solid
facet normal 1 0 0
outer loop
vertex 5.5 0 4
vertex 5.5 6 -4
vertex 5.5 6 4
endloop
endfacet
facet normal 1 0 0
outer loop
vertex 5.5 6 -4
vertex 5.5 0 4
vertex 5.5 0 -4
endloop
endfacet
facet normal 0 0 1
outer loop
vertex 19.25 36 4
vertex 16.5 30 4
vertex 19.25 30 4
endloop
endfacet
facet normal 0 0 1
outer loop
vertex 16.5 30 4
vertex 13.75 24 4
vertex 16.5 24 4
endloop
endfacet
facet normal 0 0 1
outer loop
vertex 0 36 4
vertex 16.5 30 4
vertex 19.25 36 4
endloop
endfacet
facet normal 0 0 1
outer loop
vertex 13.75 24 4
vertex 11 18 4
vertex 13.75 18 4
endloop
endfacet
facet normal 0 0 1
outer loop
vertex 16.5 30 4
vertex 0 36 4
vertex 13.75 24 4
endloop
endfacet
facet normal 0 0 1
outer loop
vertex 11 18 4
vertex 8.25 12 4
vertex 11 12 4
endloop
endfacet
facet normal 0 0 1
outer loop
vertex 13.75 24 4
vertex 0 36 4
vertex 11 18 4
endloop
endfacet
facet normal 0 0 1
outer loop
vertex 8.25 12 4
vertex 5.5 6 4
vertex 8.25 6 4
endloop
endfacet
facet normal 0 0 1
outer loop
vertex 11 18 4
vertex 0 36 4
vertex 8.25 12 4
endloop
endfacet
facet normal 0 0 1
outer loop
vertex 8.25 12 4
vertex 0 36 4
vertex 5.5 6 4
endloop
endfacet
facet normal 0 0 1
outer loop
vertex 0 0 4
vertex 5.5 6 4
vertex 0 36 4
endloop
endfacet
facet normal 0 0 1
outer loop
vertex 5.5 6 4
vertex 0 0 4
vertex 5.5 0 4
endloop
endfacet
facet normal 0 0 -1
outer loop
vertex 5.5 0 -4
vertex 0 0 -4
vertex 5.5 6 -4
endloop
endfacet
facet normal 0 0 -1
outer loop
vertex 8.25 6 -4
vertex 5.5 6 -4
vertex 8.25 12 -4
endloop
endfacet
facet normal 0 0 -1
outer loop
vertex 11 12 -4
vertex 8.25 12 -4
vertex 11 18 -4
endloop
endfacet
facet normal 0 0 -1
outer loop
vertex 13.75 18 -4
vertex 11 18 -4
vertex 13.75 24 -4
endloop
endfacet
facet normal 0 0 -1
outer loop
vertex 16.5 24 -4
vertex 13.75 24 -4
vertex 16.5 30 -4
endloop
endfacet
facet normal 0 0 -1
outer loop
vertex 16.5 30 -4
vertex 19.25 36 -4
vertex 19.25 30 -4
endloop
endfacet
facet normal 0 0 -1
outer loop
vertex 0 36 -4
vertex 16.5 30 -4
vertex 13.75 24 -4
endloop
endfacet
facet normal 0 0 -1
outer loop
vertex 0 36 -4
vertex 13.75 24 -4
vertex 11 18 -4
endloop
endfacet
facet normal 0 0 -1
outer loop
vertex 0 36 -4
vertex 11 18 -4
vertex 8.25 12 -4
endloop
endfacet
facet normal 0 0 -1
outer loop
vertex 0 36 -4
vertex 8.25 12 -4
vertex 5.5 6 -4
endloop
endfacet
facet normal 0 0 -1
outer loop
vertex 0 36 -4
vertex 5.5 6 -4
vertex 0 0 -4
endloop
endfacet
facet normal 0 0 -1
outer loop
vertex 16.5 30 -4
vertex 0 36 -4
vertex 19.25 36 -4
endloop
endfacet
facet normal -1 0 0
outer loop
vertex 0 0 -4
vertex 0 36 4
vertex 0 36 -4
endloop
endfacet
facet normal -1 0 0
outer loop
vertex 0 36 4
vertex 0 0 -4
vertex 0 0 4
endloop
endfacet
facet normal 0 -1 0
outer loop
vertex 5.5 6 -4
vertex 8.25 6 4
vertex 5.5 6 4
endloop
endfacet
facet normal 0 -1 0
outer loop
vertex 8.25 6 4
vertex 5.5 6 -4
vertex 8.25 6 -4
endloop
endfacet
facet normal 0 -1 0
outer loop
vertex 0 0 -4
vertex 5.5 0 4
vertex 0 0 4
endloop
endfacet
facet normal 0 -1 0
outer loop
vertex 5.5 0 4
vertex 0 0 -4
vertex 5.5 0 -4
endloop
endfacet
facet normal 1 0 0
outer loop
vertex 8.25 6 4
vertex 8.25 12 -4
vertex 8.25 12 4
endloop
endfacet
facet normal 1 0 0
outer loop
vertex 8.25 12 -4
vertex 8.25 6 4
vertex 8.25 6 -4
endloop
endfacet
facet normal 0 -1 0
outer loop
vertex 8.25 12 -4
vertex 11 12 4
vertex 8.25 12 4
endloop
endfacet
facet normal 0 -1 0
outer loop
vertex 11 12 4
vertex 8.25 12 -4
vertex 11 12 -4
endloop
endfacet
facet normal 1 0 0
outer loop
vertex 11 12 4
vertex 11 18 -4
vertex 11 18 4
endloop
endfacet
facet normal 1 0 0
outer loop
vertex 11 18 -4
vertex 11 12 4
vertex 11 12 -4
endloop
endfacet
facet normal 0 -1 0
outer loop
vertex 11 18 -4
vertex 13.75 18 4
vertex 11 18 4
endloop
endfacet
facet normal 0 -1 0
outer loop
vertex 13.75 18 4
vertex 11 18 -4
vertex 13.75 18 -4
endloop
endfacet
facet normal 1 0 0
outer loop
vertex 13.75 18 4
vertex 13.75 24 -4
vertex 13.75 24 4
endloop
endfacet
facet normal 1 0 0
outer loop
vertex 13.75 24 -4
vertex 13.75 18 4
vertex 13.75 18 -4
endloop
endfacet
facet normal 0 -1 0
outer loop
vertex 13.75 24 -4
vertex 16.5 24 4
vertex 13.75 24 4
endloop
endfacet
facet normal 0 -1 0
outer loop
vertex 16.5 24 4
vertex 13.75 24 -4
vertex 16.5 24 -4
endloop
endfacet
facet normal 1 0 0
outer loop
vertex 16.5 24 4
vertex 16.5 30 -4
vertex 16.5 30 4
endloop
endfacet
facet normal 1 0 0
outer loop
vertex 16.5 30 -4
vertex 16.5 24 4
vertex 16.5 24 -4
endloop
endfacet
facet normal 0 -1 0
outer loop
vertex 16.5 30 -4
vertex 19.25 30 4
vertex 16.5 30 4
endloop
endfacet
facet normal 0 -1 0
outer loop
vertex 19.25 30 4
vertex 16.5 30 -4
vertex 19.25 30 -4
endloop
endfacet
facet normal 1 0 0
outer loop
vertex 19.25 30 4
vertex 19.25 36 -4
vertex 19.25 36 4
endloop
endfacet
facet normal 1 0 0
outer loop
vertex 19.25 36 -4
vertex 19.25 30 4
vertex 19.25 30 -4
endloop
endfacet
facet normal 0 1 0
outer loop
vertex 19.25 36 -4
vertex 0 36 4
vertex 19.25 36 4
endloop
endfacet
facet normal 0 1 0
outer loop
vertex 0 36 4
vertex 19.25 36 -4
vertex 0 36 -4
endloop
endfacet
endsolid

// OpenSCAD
module horizontal_hole_step(
    width,
    length,
    height,
    diameter
    ){
        difference() {
            cube([width, length, height], true);
            cylinder(height + .2, d=diameter, center=true, $fn=360);
        }
}

module horizontal_hole_fitting(
    sw,       /* starting width */
    height,   /* height */
    diameter, /* diameter of hole */
    step,     /* how much to increase width for each step */
    steps     /* how many steps to take */
    ){
        length = diameter * 3;  
        union(){
            for (i = [0 : 1 : steps - 1]) {
                l = length/2 + (length * i);
                echo("step:", i);
                echo("width:", (sw + i * step)/2);
                echo("length:", l);
                translate([(sw + i * step)/2, l, 0])
                    horizontal_hole_step(sw + i * step, length,  height, diameter);
            }
        }
}

module width_gauge(
    sw,       /* starting width */
    height,   /* height */
    length, /* diameter of hole */
    step,    /* how much to increase width for each step */
    steps     /* how many steps to take */
    ){
        union(){
            for (i = [0 : 1 : steps - 1]) {
                l = length/2 + (length * i);
                echo("step:", i);
                echo("width:", (sw + i * step)/2);
                echo("length:", l);
                translate([(sw + i * step)/2, l, 0])
                    cube([sw + i * step, length,  height], true);
            }
        }
}


RAIL_WIDTH = 22;
RAIL_HEIGHT = 8;
HOLE_DIAMETER = 4.2;

//horizontal_hole_fitting(11, RAIL_HEIGHT, HOLE_DIAMETER, 2.75, 4);
width_gauge(5.5, RAIL_HEIGHT, 6, 2.75, 6);
